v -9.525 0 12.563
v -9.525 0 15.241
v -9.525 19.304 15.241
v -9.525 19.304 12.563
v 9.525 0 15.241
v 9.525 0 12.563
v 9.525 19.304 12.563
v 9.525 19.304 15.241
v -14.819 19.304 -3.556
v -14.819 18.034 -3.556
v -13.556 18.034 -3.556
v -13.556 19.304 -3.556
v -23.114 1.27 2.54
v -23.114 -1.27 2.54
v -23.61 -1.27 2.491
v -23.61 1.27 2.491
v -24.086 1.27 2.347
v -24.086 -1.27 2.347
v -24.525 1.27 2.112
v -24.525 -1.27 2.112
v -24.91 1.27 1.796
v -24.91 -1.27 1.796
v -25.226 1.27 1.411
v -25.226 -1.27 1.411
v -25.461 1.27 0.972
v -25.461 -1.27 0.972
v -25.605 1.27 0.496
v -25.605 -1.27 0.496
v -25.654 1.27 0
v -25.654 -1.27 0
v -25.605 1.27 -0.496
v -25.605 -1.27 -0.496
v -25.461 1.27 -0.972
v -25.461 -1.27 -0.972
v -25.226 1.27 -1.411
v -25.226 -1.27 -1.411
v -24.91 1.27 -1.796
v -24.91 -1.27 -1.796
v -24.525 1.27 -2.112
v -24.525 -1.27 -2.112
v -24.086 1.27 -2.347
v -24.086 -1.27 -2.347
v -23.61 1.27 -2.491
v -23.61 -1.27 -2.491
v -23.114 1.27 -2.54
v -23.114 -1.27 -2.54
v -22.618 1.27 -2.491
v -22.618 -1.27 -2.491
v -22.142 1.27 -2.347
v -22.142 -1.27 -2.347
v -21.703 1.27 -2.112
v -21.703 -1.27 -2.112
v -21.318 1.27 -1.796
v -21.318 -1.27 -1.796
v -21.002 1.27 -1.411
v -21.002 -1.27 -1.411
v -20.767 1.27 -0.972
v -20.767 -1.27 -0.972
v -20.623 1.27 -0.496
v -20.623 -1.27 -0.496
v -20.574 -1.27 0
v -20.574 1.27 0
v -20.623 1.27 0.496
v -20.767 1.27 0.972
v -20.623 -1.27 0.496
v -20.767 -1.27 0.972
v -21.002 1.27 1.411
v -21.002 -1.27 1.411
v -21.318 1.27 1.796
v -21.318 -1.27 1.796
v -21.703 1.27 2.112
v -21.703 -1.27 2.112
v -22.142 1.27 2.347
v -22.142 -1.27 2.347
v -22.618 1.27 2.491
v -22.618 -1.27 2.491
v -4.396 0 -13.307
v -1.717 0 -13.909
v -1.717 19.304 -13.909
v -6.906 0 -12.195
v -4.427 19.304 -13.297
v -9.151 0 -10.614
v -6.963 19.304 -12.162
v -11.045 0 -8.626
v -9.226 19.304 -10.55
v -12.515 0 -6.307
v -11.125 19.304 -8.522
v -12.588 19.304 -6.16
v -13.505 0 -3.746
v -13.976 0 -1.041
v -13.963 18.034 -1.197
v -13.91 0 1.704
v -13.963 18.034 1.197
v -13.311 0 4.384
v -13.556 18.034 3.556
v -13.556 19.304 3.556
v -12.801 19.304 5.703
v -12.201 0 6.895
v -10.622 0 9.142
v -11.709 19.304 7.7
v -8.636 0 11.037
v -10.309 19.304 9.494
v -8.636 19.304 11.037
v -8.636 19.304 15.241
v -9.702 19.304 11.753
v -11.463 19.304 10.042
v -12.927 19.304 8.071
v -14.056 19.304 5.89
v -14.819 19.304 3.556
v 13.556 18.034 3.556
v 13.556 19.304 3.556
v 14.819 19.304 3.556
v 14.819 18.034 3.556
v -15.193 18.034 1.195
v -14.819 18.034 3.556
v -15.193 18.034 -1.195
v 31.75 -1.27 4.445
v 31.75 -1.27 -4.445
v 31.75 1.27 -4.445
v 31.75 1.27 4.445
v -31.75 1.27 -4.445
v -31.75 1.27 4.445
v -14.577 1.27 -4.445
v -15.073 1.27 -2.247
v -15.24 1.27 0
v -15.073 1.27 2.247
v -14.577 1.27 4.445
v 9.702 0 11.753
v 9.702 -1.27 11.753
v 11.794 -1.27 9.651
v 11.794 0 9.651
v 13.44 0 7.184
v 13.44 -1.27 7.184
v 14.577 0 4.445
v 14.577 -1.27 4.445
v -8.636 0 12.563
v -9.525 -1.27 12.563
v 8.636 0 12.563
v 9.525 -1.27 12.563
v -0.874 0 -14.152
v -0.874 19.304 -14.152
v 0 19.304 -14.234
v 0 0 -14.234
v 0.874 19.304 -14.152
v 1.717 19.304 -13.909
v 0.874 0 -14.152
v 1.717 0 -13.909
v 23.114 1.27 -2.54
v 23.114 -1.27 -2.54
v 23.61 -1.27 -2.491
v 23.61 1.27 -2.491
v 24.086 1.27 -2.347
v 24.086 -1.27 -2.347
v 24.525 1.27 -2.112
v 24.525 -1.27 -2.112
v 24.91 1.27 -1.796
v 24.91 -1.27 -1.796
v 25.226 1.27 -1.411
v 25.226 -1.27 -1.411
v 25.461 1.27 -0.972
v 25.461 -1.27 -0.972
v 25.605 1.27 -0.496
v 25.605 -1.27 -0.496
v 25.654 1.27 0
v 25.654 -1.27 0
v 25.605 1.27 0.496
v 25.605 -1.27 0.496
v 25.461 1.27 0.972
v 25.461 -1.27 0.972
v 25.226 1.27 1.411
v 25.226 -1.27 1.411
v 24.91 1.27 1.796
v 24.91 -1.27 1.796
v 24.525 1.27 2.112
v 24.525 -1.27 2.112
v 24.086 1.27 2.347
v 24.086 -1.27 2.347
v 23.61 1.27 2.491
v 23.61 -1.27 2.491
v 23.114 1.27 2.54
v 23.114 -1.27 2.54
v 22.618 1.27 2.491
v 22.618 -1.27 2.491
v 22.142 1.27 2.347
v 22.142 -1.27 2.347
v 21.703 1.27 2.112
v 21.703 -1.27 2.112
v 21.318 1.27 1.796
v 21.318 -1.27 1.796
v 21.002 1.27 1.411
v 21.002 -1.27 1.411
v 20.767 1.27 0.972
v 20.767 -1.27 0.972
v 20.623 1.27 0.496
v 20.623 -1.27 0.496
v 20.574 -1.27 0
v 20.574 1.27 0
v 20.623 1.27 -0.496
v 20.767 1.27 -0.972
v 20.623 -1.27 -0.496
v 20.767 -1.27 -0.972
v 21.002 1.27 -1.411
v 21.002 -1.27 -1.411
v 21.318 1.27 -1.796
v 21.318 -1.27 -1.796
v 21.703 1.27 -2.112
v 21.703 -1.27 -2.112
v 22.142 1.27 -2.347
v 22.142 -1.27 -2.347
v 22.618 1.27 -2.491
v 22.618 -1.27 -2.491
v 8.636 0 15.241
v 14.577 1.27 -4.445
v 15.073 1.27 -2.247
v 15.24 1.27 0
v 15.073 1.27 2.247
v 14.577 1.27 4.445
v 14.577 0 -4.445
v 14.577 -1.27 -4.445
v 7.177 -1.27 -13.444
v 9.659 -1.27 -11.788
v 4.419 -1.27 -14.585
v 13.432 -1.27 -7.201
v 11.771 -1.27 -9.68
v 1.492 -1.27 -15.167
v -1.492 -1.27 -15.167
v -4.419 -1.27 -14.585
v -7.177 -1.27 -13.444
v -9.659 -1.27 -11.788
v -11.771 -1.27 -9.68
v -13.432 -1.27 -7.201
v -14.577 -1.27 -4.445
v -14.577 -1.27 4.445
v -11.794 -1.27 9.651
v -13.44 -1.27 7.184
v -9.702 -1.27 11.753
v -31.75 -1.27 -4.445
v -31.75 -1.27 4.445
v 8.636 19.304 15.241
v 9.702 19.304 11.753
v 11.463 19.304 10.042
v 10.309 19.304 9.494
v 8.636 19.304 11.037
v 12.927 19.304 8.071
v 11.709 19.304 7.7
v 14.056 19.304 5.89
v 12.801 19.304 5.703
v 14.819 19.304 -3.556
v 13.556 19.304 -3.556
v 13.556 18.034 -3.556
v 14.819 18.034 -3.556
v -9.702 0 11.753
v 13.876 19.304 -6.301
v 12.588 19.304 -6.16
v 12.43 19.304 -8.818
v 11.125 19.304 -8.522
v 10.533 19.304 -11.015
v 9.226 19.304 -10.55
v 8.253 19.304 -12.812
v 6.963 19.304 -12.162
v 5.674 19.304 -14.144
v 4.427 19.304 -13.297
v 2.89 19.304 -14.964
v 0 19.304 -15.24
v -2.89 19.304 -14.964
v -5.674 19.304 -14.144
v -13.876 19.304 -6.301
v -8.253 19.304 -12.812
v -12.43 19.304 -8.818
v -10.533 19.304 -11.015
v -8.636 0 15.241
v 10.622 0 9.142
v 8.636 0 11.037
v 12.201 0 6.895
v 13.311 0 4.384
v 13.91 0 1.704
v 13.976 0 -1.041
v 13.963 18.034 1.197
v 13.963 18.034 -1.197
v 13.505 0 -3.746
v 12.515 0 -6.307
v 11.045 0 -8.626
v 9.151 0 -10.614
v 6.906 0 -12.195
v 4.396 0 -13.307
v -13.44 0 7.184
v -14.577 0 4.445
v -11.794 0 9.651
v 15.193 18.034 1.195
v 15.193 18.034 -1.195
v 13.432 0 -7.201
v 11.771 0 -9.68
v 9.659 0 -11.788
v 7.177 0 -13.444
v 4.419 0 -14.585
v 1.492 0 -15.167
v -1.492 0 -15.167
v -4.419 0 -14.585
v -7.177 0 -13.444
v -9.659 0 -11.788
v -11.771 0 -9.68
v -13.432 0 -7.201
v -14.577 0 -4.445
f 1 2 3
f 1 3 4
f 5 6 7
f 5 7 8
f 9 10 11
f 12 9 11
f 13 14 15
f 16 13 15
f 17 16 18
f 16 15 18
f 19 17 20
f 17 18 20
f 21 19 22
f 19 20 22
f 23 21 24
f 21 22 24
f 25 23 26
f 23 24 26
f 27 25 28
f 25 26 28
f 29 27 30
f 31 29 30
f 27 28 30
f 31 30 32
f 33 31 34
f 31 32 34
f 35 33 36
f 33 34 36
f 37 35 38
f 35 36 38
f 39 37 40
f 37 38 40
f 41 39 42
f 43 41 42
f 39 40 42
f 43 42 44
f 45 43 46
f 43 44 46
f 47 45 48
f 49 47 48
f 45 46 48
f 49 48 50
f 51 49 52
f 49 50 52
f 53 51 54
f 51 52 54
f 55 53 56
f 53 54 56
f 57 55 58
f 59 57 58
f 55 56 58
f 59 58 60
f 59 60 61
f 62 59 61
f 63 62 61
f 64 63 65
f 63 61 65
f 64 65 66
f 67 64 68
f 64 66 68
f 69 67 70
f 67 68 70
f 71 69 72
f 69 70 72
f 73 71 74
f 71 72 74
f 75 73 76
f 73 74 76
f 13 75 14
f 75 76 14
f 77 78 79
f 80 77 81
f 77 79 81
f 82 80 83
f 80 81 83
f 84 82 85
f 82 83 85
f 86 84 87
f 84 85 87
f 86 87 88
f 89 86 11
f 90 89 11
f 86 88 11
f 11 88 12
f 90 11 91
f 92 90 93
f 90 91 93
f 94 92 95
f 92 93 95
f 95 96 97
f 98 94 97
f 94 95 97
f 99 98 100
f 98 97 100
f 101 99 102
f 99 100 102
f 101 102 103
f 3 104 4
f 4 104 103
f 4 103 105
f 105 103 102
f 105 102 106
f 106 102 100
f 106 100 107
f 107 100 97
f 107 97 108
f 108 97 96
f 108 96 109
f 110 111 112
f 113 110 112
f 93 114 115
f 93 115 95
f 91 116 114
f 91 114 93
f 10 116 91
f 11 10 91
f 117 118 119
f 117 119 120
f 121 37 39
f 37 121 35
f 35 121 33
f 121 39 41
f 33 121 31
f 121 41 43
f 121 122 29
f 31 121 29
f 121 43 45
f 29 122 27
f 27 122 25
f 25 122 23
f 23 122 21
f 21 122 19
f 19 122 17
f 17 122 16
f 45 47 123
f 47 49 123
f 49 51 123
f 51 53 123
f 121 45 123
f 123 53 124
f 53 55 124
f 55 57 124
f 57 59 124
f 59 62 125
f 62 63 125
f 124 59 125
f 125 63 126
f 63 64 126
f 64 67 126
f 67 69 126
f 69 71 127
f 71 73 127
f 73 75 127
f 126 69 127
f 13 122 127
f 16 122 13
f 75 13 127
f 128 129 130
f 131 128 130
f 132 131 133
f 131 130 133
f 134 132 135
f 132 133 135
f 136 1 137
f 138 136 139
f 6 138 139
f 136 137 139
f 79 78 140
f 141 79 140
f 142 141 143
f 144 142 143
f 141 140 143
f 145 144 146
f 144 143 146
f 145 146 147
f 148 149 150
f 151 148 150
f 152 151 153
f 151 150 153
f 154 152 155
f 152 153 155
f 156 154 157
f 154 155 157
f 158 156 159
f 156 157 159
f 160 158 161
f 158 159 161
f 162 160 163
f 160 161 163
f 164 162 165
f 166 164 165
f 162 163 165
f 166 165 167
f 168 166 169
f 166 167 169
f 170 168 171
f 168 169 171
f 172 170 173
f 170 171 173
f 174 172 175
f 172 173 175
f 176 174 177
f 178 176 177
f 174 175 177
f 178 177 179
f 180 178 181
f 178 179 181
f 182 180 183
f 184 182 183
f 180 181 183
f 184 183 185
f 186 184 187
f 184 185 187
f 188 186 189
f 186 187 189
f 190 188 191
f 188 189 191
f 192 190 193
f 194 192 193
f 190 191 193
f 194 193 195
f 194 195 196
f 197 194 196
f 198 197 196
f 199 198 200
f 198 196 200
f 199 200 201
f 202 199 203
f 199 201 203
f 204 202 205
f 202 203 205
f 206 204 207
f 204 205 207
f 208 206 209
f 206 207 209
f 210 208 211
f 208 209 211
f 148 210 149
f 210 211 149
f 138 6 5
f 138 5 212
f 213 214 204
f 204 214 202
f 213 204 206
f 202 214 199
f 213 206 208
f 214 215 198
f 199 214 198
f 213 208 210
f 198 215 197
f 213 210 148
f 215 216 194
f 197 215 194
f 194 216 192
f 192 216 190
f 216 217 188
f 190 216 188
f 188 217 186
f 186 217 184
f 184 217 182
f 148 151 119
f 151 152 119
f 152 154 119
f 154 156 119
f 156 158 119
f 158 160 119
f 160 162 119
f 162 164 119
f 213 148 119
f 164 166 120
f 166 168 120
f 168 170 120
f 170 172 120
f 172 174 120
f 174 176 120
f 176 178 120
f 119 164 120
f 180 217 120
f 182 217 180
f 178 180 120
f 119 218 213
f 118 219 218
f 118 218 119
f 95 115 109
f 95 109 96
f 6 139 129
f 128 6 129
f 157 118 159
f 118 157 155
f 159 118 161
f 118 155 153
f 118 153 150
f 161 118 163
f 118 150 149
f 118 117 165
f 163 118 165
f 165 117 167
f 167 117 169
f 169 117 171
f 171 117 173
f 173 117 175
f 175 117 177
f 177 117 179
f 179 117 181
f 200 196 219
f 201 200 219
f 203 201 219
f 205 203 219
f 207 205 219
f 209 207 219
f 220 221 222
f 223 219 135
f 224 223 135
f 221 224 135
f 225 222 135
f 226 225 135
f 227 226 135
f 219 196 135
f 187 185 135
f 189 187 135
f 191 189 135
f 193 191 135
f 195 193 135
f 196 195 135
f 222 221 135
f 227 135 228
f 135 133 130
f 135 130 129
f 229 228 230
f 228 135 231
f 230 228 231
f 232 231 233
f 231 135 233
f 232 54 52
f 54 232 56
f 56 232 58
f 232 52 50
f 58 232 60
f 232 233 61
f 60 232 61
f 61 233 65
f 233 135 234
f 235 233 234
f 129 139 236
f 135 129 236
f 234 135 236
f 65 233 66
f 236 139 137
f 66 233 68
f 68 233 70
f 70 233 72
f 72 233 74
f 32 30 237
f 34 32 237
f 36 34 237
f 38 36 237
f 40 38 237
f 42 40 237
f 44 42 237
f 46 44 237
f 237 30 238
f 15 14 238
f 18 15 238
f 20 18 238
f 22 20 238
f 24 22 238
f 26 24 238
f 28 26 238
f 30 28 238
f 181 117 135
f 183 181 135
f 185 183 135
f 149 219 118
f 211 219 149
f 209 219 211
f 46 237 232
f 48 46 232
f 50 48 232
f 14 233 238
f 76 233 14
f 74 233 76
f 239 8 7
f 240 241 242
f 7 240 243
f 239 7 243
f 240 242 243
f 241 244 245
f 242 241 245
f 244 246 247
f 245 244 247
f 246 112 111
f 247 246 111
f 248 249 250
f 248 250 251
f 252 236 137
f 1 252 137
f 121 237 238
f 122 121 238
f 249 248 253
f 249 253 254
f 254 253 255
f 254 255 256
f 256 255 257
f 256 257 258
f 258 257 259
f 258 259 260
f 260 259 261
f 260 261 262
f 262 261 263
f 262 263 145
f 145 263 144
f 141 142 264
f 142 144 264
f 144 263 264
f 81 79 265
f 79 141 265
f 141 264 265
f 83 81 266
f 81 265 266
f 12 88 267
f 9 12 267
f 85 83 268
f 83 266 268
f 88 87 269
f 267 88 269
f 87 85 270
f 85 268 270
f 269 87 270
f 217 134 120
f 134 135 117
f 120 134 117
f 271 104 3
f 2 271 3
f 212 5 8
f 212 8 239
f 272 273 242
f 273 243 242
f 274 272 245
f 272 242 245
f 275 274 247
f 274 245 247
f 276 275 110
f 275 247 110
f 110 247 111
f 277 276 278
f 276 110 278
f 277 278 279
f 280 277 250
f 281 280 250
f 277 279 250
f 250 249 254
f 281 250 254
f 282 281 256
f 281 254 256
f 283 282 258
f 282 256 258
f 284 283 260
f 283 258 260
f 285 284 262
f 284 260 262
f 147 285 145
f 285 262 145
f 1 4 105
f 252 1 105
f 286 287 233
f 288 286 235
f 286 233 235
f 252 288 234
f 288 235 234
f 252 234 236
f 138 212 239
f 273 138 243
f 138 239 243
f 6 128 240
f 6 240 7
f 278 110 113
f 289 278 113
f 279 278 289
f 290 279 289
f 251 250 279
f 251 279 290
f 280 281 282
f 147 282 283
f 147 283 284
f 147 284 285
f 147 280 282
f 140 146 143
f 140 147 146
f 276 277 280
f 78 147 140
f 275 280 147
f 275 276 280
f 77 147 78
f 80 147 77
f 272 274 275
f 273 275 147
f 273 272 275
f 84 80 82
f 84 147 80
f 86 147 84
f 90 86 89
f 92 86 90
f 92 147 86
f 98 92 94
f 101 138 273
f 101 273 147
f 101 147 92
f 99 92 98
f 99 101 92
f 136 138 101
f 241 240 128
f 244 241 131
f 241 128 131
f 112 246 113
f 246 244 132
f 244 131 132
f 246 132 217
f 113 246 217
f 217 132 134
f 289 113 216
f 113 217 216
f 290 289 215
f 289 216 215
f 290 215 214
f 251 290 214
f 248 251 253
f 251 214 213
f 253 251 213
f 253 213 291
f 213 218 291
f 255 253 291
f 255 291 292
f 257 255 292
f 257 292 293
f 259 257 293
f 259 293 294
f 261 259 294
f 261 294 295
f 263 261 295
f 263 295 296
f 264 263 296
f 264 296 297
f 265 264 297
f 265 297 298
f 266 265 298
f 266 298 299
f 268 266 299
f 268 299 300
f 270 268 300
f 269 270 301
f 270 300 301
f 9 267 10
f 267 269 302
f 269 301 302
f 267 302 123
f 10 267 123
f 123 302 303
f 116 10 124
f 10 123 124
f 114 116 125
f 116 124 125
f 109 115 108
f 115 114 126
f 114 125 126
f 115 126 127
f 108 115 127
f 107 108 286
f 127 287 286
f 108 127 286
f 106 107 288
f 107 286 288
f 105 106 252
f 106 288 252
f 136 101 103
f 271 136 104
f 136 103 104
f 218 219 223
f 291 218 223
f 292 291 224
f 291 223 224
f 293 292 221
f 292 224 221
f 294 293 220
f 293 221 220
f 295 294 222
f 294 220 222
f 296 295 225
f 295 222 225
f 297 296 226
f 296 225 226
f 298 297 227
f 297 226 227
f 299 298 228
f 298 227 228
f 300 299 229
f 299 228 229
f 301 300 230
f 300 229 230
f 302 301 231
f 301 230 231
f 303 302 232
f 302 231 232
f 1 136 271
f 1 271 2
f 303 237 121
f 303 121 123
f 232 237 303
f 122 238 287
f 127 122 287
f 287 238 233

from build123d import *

# Parameters (mm, degrees)
SKETCH1_R           = 15.24
SKETCH1_R_2         = 14.01445
BOSS_EXTRUDE1_DEPTH = 19.304
SKETCH2_R           = 14.01445
CUT_EXTRUDE1_DEPTH  = 29.934204707
CUT_EXTRUDE2_DEPTH  = 29.934204707
BOSS_EXTRUDE2_START = 1.27
BOSS_EXTRUDE2_DEPTH = 1.27
SKETCH6_R           = 4.699
CUT_EXTRUDE3_DEPTH  = 29.934204707
SKETCH8_W           = 17.272
SKETCH8_H           = 8.89
SKETCH8_R           = 2.54
BOSS_EXTRUDE3_DEPTH = 2.54
SKETCH9_W           = 2.159
SKETCH9_H           = 7.112
CUT_EXTRUDE4_DEPTH  = 1.27


with BuildPart() as part:
    # Sketch1 → Boss-Extrude1 (new body)
    # profile 1 of 2: a face of its own
    with BuildSketch(Plane(origin=(0, 0, 0), x_dir=(1, 0, 0), z_dir=(0, 1, 0))):
        Circle(SKETCH1_R)
        Circle(SKETCH1_R_2, mode=Mode.SUBTRACT)
    # profile 2 of 2: a face of its own
    with BuildSketch(Plane(origin=(0, 0, 0), x_dir=(1, 0, 0), z_dir=(0, 1, 0))):
        Polygon((-9.525, -12.563180017), (-10.16, -9.652937833), (10.16, -9.652937833), (9.525, -12.563180017), (9.525, -15.240937833), (-9.525, -15.240937833), align=None)
    extrude(amount=BOSS_EXTRUDE1_DEPTH)

    # Sketch2 → Cut-Extrude1 (cut, through all)
    with BuildSketch(Plane(origin=(0, 19.304, 0), x_dir=(1, 0, 0), z_dir=(0, 1, 0))):
        Circle(SKETCH2_R)
    extrude(amount=-CUT_EXTRUDE1_DEPTH, mode=Mode.SUBTRACT)

    # Sketch3 → Cut-Extrude2 (cut, through all)
    with BuildSketch(Plane(origin=(0, 19.304, 0), x_dir=(1, 0, 0), z_dir=(0, 1, 0))):
        with BuildLine():
            Line((-8.636, -14.01445), (-8.636, -15.240937833))
            Line((-8.636, -15.240937833), (8.636, -15.240937833))
            Line((8.636, -15.240937833), (8.636, -14.01445))
            Line((8.636, -14.01445), (8.636, -11.037405166))
            ThreePointArc((8.636, -11.037405166), (0, -14.01445), (-8.636, -11.037405166))
            Line((-8.636, -11.037405166), (-8.636, -14.01445))
        make_face()
    extrude(amount=-CUT_EXTRUDE2_DEPTH, mode=Mode.SUBTRACT)

    # Sketch4 → Boss-Extrude2 (add)
    with BuildSketch(Plane.XZ.offset(BOSS_EXTRUDE2_START)):
        with BuildLine():
            Line((9.525, 12.563180017), (9.701775888, 11.753005769))
            ThreePointArc((9.701775888, 11.753005769), (0, -15.24), (-9.701775888, 11.753005769))
            Line((-9.701775888, 11.753005769), (-9.525, 12.563180017))
            Line((-9.525, 12.563180017), (9.525, 12.563180017))
        make_face()
    extrude(amount=-BOSS_EXTRUDE2_DEPTH)

    # Sketch6 → Cut-Extrude3 (cut, through all)
    with BuildSketch(Plane.XZ):
        with Locations((0, -9.534819983)):
            Circle(SKETCH6_R)
    extrude(amount=-CUT_EXTRUDE3_DEPTH, mode=Mode.SUBTRACT)

    # Sketch8 → Boss-Extrude3 (add)
    # profile 1 of 2: a face of its own
    with BuildSketch(Plane.XZ.offset(1.27)):
        with Locations((23.114, 0)):
            Rectangle(SKETCH8_W, SKETCH8_H)
        with Locations((23.114, 0)):
            Circle(SKETCH8_R, mode=Mode.SUBTRACT)
    # profile 2 of 2: a face of its own
    with BuildSketch(Plane.XZ.offset(1.27)):
        with Locations((-23.114, 0)):
            Rectangle(SKETCH8_W, SKETCH8_H)
        with Locations((-23.114, 0)):
            Circle(SKETCH8_R, mode=Mode.SUBTRACT)
    extrude(amount=-BOSS_EXTRUDE3_DEPTH)

    # Sketch9 → Cut-Extrude4 (cut)
    with BuildSketch(Plane(origin=(0, 19.304, 0), x_dir=(1, 0, 0), z_dir=(0, 1, 0))):
        with Locations((14.605, 0)):
            Rectangle(SKETCH9_W, SKETCH9_H)
        with Locations((-14.605, 0)):
            Rectangle(SKETCH9_W, SKETCH9_H)
    extrude(amount=-CUT_EXTRUDE4_DEPTH, mode=Mode.SUBTRACT)


solid = part.part
